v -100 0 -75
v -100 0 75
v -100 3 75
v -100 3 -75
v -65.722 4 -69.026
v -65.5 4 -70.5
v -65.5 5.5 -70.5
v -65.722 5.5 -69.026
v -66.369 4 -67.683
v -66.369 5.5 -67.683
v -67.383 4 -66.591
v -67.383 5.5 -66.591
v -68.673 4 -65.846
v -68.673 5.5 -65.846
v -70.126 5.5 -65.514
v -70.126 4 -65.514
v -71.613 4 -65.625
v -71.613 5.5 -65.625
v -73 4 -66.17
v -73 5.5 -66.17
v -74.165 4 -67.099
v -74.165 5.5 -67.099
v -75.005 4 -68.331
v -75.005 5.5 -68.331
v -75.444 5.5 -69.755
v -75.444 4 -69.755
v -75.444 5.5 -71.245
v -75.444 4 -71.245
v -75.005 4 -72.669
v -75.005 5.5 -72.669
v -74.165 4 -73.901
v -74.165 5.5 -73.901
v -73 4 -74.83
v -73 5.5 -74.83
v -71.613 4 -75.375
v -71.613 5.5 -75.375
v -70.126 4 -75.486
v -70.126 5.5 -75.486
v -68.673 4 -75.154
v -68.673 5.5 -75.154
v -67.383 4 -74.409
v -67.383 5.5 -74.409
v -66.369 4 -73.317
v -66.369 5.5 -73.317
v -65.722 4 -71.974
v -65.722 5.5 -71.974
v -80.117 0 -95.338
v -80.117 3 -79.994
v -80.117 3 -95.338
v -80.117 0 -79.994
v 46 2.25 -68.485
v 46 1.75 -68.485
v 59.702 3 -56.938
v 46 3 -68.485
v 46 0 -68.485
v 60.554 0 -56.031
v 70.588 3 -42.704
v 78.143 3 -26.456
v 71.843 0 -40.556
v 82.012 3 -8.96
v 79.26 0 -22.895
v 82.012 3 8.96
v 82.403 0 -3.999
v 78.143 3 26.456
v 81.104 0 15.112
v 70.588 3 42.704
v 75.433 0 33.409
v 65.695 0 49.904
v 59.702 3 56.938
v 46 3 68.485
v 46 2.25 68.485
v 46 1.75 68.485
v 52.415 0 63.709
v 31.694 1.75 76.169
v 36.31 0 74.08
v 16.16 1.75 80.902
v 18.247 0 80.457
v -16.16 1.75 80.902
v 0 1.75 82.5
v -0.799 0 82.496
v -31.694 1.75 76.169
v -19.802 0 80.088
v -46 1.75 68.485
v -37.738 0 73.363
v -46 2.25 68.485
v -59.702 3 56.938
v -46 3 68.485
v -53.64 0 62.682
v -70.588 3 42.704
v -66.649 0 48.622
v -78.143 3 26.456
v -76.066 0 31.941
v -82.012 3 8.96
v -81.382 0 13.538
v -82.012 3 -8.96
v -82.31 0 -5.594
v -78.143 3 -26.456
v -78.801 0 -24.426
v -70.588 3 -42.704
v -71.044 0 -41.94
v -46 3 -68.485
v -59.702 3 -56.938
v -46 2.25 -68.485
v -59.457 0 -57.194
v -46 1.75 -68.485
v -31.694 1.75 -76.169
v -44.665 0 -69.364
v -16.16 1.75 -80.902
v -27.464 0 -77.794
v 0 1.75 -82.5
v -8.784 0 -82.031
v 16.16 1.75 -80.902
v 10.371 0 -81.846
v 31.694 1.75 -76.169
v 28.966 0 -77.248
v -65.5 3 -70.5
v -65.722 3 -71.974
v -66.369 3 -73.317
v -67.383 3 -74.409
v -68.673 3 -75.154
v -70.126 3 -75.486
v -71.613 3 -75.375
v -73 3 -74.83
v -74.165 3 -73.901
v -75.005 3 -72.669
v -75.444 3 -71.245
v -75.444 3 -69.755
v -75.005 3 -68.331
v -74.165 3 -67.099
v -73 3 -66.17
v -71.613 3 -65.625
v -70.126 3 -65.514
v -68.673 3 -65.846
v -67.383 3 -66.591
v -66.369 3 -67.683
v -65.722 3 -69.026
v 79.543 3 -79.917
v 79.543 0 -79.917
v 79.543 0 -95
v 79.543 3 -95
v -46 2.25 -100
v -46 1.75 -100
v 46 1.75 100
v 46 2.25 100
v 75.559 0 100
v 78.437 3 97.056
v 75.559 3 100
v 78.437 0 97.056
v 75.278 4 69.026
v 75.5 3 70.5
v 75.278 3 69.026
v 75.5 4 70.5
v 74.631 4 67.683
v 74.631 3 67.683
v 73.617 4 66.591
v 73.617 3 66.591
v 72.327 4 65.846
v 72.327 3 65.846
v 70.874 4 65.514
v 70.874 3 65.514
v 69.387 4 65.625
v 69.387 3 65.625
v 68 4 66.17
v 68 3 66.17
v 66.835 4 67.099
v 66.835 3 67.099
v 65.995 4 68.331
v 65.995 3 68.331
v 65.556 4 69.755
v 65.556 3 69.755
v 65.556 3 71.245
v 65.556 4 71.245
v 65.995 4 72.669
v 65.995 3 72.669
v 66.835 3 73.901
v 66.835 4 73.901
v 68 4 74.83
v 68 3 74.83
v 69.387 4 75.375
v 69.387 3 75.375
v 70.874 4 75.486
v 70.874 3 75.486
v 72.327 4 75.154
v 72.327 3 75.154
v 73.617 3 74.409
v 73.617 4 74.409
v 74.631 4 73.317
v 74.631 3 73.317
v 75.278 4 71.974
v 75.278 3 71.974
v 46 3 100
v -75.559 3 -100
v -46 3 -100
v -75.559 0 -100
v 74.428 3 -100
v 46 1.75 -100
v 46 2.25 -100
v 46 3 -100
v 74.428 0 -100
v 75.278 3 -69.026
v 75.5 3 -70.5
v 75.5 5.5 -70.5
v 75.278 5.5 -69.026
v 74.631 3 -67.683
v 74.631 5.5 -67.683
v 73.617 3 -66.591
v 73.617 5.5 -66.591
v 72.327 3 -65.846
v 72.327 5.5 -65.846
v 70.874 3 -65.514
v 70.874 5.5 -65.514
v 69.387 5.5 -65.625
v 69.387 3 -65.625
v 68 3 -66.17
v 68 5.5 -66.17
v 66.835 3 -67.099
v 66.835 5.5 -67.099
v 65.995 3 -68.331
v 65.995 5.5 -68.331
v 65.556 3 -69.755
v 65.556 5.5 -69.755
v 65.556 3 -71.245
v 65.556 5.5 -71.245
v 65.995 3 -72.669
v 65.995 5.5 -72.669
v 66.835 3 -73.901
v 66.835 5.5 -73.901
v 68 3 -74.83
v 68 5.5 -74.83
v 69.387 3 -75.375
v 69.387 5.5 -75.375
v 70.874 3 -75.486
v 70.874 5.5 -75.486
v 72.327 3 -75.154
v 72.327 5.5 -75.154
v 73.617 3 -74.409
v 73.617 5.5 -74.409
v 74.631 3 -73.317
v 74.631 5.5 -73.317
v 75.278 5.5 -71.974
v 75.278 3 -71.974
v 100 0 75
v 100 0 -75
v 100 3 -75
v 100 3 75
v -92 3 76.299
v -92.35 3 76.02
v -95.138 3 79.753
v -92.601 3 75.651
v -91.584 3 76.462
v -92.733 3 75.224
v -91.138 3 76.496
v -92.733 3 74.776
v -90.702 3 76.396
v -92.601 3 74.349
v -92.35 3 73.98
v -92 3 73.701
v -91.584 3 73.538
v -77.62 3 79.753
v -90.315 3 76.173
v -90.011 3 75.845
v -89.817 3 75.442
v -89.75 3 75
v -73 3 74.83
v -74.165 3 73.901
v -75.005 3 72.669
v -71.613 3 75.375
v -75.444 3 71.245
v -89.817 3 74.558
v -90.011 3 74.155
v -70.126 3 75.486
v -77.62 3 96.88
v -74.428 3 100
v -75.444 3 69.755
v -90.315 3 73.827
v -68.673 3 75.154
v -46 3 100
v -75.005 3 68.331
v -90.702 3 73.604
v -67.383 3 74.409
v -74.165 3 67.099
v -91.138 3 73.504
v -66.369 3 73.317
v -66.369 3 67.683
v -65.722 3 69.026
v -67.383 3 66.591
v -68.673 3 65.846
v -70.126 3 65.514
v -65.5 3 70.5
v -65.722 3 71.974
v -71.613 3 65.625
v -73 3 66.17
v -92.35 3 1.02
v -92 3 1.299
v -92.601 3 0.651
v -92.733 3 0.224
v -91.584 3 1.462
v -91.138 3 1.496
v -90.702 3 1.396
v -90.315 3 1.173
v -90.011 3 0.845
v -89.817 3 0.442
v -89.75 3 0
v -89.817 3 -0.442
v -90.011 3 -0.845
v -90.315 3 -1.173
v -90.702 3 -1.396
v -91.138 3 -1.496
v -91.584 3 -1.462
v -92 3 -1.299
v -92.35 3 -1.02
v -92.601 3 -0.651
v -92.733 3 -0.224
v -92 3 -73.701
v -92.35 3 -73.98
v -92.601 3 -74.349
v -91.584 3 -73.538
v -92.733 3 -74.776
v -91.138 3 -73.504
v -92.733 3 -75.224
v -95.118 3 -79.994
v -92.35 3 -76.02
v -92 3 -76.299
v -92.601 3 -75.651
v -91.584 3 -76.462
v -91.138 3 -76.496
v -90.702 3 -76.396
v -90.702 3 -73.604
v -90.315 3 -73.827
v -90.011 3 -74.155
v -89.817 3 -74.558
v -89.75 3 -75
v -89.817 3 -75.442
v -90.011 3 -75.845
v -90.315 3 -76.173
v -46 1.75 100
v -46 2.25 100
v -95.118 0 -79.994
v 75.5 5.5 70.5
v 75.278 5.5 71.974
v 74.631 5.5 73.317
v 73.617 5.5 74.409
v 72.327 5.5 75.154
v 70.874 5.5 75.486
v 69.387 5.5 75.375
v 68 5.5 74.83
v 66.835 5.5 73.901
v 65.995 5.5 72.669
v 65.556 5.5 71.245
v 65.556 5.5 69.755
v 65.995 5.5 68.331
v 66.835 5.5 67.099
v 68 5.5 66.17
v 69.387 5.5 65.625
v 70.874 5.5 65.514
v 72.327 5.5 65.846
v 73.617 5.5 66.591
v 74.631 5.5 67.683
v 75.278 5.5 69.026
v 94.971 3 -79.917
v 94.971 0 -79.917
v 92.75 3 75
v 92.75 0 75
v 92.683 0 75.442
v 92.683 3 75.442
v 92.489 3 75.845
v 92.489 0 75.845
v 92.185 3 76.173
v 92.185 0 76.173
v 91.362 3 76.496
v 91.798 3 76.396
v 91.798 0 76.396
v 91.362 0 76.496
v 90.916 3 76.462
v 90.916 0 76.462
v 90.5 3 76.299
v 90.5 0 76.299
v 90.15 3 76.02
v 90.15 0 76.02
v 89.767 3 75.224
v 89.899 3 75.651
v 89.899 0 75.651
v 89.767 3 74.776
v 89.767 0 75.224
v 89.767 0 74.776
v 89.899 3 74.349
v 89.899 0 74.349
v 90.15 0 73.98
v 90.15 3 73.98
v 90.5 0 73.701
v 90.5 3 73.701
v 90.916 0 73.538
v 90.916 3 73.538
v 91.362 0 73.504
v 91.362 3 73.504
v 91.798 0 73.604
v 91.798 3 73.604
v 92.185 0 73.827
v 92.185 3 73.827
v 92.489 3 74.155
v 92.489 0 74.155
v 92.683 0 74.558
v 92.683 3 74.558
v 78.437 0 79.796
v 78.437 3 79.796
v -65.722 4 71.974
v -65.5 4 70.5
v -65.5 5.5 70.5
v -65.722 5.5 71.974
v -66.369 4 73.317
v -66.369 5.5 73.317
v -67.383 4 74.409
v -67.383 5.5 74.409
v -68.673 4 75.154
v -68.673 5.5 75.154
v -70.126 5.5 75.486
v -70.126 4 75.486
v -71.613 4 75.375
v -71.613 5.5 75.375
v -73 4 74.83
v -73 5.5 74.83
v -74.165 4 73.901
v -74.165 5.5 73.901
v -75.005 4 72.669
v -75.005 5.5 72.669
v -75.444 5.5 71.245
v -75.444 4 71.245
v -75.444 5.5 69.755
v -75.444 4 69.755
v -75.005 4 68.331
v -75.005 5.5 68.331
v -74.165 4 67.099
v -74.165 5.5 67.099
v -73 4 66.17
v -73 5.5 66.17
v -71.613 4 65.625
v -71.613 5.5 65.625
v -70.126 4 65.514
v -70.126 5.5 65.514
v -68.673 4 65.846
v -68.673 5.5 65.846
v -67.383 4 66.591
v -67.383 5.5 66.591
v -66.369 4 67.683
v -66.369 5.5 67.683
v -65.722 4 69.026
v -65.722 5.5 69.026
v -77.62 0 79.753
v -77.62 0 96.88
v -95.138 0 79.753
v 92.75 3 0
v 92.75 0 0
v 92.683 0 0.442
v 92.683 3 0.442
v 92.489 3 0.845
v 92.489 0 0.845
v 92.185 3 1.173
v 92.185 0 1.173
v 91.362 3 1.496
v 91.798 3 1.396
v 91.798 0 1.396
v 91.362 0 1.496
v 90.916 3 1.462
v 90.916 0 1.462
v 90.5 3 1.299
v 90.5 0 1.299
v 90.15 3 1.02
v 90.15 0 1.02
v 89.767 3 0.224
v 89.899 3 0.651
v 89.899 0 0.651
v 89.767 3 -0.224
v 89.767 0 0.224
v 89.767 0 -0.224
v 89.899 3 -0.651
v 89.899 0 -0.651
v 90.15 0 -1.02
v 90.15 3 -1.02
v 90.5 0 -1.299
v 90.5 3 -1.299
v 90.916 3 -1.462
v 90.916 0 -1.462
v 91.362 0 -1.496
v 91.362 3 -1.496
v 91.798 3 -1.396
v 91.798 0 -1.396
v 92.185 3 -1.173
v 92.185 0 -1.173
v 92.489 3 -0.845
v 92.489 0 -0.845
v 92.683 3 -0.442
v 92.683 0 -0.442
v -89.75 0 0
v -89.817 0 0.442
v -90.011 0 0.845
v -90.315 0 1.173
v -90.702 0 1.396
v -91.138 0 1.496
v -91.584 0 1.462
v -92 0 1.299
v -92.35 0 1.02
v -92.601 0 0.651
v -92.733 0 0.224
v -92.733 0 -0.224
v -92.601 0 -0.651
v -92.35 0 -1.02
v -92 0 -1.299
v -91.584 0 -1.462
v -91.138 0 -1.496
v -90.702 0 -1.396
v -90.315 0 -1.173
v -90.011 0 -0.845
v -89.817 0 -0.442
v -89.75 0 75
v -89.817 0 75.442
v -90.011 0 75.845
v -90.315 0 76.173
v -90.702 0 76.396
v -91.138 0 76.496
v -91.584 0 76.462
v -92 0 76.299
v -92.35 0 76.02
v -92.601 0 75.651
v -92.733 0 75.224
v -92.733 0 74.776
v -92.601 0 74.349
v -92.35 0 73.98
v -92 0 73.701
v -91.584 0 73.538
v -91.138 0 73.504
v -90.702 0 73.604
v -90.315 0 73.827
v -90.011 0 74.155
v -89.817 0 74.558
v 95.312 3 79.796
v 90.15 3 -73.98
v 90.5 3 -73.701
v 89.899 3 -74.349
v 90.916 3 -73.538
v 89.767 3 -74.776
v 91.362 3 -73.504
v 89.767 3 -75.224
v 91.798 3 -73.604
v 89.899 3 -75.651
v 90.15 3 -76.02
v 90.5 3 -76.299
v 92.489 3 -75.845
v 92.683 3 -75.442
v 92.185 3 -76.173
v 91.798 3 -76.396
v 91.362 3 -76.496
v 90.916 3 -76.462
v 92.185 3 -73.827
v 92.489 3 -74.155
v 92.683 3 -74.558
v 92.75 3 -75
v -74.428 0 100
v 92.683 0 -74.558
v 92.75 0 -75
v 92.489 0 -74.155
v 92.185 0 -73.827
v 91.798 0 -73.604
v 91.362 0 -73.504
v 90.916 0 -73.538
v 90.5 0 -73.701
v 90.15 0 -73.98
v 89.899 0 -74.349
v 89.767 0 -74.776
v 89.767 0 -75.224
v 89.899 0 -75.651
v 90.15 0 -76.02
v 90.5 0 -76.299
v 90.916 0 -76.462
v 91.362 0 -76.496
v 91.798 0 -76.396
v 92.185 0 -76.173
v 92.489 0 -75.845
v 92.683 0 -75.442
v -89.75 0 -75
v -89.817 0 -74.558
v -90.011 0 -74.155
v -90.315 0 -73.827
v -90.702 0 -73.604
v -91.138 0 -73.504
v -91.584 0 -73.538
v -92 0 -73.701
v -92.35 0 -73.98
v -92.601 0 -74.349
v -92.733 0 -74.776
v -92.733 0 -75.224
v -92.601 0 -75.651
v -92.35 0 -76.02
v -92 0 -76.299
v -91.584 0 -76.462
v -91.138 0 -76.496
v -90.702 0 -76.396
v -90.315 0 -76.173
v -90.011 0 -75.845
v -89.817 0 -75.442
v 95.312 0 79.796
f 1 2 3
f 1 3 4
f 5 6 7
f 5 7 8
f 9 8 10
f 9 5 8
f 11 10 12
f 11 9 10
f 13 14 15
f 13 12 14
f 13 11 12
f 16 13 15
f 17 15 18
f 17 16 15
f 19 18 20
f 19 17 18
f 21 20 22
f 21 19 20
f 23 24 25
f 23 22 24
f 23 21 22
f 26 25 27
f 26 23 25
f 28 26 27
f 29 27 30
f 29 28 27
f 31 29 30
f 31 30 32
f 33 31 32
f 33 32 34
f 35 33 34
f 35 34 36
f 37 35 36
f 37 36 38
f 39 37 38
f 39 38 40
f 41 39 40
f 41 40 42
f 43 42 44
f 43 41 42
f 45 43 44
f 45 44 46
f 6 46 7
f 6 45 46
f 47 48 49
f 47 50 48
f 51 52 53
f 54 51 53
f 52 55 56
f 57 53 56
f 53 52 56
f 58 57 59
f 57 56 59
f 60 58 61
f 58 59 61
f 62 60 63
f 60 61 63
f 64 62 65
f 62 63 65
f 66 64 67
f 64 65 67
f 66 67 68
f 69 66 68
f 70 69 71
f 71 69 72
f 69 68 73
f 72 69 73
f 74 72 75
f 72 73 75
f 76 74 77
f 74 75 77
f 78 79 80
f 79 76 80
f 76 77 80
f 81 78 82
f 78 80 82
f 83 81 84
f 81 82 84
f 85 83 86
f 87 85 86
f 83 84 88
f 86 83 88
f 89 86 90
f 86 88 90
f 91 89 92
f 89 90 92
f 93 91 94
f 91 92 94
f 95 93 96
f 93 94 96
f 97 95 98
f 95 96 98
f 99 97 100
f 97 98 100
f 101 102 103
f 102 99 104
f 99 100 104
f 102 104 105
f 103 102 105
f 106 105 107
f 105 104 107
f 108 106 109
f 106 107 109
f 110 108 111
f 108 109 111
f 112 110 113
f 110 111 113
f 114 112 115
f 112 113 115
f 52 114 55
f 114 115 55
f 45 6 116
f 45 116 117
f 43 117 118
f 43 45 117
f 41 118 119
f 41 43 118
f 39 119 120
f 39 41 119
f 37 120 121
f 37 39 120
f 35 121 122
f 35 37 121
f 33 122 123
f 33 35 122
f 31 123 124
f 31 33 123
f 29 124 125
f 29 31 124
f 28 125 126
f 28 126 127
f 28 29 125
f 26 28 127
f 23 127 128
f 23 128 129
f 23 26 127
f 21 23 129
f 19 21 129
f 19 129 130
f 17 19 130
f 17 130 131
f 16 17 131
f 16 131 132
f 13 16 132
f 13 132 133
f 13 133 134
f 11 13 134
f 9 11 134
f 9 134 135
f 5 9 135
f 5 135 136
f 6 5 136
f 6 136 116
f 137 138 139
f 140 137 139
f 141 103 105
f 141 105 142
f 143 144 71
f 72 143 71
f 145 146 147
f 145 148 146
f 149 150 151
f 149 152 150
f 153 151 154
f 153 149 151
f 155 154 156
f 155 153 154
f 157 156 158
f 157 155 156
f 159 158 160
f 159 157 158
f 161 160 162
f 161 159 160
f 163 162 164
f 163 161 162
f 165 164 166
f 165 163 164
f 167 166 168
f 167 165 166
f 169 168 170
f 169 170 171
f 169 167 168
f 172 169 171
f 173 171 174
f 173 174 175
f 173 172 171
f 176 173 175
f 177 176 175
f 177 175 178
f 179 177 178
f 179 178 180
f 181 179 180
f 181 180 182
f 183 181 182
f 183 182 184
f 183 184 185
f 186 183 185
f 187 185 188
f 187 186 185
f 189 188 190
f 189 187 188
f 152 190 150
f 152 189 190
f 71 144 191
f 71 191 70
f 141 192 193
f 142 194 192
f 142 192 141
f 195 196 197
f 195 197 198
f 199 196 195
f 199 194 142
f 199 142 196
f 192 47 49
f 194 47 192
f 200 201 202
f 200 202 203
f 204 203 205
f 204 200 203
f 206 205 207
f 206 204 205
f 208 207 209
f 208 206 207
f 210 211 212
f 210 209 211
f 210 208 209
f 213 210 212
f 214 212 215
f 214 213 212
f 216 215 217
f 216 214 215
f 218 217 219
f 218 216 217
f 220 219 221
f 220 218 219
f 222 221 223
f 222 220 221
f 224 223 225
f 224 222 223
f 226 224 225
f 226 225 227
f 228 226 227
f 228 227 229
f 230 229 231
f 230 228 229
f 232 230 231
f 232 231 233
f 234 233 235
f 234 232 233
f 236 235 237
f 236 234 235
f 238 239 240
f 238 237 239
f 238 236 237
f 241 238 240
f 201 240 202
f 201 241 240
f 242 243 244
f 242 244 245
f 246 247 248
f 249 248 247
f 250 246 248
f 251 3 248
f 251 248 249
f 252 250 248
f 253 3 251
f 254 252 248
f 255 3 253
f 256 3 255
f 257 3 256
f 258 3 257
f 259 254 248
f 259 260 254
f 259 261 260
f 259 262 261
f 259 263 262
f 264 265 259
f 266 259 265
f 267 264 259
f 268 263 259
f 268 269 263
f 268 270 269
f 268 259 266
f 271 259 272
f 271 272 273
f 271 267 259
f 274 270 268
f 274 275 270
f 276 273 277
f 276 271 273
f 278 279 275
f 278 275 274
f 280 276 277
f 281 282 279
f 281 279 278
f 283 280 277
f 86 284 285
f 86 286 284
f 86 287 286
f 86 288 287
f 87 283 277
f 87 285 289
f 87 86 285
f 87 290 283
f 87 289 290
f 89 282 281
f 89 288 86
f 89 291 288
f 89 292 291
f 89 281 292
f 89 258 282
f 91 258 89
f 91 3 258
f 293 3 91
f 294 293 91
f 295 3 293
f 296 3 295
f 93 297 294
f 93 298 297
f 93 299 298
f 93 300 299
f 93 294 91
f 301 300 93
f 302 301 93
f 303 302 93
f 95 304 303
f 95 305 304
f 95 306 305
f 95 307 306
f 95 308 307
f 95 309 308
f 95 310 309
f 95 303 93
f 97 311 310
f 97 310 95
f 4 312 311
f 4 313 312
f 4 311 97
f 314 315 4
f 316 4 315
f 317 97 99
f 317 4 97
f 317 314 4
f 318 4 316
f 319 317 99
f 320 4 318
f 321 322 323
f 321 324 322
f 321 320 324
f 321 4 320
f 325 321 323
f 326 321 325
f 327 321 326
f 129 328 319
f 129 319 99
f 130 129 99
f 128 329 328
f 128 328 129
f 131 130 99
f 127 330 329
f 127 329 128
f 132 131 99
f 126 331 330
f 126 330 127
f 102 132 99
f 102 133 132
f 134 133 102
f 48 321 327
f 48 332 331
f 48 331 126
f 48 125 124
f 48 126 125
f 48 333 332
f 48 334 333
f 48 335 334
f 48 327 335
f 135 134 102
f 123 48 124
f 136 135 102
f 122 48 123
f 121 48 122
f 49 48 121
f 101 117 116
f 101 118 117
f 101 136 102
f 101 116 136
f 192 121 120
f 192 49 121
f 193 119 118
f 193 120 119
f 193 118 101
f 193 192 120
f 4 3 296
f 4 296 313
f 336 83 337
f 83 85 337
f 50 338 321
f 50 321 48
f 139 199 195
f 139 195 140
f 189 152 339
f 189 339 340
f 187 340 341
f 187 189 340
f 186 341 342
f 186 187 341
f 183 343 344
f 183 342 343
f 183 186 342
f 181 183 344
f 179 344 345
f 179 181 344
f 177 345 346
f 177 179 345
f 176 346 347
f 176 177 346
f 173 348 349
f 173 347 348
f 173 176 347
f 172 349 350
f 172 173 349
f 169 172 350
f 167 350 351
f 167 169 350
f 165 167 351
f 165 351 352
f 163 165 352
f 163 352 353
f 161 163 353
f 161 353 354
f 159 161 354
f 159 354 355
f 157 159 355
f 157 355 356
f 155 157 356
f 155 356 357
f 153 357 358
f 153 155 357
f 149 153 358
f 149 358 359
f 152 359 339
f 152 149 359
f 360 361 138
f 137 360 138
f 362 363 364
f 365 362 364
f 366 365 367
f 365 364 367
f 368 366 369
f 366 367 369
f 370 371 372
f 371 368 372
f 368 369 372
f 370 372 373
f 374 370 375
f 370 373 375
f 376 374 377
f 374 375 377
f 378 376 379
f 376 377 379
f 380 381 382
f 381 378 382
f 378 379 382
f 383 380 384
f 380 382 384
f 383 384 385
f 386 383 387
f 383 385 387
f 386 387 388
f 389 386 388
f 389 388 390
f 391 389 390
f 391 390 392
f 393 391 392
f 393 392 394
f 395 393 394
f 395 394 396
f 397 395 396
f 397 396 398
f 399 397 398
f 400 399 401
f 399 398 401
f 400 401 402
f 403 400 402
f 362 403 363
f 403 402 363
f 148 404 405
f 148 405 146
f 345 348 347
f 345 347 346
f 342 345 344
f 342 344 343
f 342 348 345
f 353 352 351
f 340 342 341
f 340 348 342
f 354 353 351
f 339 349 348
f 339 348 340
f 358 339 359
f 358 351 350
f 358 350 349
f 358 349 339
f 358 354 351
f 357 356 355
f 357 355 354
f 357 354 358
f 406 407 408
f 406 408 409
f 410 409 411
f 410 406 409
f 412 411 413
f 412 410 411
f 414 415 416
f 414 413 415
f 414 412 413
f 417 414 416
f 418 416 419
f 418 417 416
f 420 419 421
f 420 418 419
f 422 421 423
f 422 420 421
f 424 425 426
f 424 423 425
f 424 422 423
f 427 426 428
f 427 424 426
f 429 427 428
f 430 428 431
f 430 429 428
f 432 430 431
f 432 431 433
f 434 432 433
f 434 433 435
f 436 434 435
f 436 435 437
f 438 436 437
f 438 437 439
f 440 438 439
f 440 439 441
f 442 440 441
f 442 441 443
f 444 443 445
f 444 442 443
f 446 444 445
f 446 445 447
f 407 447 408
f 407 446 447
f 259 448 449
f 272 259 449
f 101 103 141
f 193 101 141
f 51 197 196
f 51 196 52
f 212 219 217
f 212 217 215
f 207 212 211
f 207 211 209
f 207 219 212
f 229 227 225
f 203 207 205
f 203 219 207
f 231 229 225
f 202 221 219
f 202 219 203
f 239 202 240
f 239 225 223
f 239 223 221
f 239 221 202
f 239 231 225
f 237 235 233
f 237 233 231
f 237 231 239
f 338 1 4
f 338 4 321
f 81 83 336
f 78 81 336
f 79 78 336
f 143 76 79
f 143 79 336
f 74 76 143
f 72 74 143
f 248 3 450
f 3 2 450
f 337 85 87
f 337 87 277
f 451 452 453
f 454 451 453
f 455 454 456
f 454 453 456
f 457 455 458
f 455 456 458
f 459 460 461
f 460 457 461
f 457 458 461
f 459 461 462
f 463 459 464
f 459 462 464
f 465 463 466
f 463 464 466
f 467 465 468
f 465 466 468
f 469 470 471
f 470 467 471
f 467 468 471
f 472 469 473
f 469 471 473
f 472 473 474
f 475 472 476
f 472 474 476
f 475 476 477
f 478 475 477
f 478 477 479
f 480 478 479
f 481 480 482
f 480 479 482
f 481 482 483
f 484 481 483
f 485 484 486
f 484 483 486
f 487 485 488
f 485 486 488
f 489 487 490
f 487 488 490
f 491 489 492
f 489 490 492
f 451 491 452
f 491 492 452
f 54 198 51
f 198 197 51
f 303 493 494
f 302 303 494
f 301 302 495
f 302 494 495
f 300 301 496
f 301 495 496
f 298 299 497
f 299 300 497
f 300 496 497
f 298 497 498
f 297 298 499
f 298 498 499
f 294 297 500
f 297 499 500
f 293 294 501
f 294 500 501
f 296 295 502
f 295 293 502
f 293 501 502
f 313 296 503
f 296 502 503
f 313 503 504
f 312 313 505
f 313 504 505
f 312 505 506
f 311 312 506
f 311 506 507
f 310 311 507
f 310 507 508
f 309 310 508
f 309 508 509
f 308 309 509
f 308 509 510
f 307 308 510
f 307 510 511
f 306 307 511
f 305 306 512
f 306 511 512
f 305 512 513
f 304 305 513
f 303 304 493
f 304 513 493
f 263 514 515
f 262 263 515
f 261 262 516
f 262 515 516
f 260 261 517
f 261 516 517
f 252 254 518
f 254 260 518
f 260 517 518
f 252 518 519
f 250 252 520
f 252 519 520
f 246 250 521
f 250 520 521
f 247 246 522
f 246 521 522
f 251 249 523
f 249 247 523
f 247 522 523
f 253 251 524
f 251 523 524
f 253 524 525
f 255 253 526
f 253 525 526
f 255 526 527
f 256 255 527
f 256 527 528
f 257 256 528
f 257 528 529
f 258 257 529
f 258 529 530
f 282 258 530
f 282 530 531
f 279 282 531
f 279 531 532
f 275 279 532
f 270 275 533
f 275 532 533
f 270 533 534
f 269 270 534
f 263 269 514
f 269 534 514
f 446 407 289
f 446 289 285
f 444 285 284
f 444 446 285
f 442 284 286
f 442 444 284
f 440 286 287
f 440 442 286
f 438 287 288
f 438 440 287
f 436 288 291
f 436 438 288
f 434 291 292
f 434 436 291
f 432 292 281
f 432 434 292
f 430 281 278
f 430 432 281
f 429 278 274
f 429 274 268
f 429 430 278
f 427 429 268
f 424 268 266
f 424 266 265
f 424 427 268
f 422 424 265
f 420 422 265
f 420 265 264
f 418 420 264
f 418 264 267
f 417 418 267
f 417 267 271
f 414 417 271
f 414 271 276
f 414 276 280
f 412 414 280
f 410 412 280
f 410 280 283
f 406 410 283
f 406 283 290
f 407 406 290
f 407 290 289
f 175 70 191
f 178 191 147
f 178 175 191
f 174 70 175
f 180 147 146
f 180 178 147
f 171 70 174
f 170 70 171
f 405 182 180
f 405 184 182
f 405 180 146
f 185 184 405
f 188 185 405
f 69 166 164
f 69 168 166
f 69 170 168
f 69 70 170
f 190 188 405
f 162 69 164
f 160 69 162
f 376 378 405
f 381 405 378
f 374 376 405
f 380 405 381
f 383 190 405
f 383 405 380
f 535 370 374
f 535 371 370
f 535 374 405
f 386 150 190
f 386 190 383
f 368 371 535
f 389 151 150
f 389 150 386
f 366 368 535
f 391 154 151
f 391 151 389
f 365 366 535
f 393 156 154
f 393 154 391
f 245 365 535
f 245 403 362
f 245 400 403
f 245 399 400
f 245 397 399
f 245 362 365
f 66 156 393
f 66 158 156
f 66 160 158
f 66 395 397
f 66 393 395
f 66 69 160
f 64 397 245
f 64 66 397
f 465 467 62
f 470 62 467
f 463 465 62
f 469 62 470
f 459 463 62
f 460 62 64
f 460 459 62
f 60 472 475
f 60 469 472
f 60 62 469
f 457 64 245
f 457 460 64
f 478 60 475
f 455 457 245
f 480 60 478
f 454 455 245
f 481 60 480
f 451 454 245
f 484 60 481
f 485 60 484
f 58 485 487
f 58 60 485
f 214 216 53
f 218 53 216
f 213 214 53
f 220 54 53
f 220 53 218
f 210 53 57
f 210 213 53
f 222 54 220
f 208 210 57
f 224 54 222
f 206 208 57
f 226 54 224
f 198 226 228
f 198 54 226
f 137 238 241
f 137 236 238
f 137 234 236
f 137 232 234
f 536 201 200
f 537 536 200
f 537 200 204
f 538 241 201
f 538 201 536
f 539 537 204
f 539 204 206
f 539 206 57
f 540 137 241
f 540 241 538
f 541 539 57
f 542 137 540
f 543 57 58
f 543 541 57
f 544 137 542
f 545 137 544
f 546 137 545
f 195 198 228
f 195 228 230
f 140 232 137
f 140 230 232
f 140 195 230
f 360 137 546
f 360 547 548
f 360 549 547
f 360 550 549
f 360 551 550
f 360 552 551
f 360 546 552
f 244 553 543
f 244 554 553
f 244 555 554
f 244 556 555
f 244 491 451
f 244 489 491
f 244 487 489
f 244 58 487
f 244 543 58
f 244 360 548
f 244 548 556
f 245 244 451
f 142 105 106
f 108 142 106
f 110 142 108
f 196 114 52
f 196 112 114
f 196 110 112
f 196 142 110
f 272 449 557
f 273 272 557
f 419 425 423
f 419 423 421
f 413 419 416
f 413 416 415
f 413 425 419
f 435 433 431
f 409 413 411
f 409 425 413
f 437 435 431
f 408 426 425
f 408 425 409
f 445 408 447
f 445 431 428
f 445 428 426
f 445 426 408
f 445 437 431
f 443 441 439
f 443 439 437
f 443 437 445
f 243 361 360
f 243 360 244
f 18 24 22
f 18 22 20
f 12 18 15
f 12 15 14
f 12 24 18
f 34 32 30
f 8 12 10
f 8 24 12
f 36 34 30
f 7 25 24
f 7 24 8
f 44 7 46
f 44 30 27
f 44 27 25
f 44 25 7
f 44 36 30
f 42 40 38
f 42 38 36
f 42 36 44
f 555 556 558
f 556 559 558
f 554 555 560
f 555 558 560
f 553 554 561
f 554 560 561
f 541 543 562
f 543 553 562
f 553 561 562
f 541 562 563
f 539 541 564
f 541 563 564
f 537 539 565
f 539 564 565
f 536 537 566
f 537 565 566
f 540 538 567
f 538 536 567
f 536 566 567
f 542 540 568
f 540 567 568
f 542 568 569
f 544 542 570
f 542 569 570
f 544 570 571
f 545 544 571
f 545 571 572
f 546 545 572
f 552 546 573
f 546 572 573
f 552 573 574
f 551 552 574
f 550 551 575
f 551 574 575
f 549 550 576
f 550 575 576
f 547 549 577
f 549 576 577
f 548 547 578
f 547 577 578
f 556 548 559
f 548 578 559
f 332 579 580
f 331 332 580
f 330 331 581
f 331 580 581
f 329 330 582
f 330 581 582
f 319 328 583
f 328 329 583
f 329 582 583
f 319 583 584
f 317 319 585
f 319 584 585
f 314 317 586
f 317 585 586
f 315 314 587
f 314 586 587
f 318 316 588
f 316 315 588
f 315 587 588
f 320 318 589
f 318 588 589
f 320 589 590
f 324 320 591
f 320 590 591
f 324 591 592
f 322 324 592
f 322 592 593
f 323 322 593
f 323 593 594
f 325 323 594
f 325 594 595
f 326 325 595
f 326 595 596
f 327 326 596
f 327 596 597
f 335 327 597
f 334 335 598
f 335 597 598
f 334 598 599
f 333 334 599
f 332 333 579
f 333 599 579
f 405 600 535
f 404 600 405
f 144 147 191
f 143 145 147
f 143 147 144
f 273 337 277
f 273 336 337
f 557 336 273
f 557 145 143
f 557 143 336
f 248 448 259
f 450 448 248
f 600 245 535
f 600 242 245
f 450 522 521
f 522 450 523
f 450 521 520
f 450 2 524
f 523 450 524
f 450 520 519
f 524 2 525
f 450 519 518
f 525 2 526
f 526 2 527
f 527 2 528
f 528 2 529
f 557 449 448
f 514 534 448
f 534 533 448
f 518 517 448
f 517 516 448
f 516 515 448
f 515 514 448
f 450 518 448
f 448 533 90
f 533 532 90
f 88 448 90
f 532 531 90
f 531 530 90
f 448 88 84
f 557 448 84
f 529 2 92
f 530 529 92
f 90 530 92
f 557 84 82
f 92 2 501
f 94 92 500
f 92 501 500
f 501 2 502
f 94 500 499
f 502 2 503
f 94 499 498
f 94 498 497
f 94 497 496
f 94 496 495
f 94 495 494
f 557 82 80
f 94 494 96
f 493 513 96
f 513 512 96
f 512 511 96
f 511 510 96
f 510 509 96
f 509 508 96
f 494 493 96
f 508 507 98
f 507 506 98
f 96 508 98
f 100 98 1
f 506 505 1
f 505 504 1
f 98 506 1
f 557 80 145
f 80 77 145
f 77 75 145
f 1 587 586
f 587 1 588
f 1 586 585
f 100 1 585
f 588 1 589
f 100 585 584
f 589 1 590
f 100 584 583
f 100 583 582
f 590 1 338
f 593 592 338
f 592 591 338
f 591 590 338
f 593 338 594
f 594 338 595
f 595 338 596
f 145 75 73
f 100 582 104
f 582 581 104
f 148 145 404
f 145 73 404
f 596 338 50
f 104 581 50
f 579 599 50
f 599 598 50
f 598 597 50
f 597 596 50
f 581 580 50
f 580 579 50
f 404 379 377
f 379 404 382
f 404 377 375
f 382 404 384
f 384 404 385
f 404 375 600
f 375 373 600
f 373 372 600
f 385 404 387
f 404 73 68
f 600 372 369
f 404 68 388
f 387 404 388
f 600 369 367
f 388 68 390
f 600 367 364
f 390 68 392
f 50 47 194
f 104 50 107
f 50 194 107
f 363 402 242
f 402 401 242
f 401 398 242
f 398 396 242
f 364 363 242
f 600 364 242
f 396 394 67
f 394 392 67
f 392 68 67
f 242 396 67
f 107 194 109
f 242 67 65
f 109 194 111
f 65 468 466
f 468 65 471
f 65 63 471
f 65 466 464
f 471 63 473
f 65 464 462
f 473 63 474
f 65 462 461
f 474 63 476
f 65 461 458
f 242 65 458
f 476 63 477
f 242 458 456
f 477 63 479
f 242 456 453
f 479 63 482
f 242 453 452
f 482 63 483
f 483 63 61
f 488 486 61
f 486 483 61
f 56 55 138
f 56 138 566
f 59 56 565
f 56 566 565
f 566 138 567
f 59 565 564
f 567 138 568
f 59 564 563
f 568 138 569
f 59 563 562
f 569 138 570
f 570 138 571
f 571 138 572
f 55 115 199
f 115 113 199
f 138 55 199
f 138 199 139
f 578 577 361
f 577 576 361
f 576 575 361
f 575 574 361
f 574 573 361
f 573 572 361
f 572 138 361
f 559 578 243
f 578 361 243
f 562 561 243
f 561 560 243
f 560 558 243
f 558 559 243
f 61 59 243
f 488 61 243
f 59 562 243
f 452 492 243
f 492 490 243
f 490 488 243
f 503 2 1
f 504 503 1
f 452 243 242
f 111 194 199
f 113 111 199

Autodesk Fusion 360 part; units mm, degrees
sketch "Sketch1" plane through (0, 0, 0) normal (0, 1, 0) x (1, 0, 0) in component "Raam_v3"
  line L0 (-100, 100) -> (100, 100)
  line L1 (100, 100) -> (100, -100)
  line L2 (100, -100) -> (-100, -100)
  line L3 (-100, -100) -> (-100, 100)
  circle A0 centre (0, 0) radius 82.5
  line L4 (-70.5, -70.5) -> (70.5, -70.5) construction
  line L5 (70.5, -70.5) -> (70.5, 70.5) construction
  line L6 (70.5, 70.5) -> (-70.5, 70.5) construction
  line L7 (-70.5, 70.5) -> (-70.5, -70.5) construction
  line L8 (-46, -100) -> (46, -100)
  line L9 (46, -100) -> (46, -68)
  line L10 (46, -68) -> (-46, -68)
  line L11 (-46, -68) -> (-46, -100)
  line L12 (-46, 100) -> (46, 100)
  line L13 (46, 100) -> (46, 68)
  line L14 (46, 68) -> (-46, 68)
  line L15 (-46, 68) -> (-46, 100)
  circle A1 centre (70.5, -70.5) radius 5
  circle A2 centre (-70.5, -70.5) radius 5
  circle A3 centre (70.5, 70.5) radius 5
  circle A4 centre (-70.5, 70.5) radius 5
  line L16 (-91.25, -91.25) -> (91.25, -91.25) construction
  line L17 (91.25, -91.25) -> (91.25, 91.25) construction
  line L18 (91.25, 91.25) -> (-91.25, 91.25) construction
  line L19 (-91.25, 91.25) -> (-91.25, -91.25) construction
  line L20 (0, -100) -> (0, 100) construction
  line L21 (-100, 0) -> (100, 0) construction
  line L22 (-100, -75) -> (-74.4285, -100)
  line L23 (100, -75) -> (75.5588, -100)
  line L24 (-100, 75) -> (-75.5588, 100)
  line L25 (74.4285, 100) -> (100, 75)
  circle A5 centre (-91.25, 0) radius 1.5
  circle A6 centre (91.25, 0) radius 1.5
  line L26 (-100, -75) -> (100, -75) construction
  circle A7 centre (91.25, -75) radius 1.5
  line L27 (-100, 75) -> (100, 75) construction
  circle A8 centre (91.25, 75) radius 1.5
  circle A9 centre (-91.25, 75) radius 1.5
  circle A10 centre (-91.25, -75) radius 1.5
  line L28 (-95.1383, -79.753) -> (-77.6201, -79.753)
  line L29 (-77.6201, -79.753) -> (-77.6201, -96.8797)
  line L30 (-83.7274, -79.753) -> (-83.7274, -80)
  line L31 (95.3116, -79.7956) -> (78.4368, -79.7956)
  line L32 (78.4368, -79.7956) -> (78.4368, -97.0562)
  line L33 (-95.1178, 79.9938) -> (-80.1166, 79.9938)
  line L34 (-80.1166, 79.9938) -> (-80.1166, 95.3379)
  line L35 (94.9708, 79.9168) -> (79.5428, 79.9168)
  line L36 (79.5428, 79.9168) -> (79.5428, 95)
  dimension "d1" = 200
  dimension "d2" = 200
  dimension "d3" = 165
  dimension "d6" = 141
  dimension "d7" = 141
  dimension "d8" = 29.5
  dimension "d9" = 29.5
  dimension "d11" = 100
  dimension "d12" = 100
  dimension "d18" = 92
  dimension "d19" = 32
  dimension "d20" = 46
  dimension "d21" = 92
  dimension "d22" = 32
  dimension "d23" = 46
  dimension "d24" = 10
  dimension "d25" = 10
  dimension "d26" = 10
  dimension "d27" = 10
  dimension "d28" = 182.5
  dimension "d29" = 182.5
  dimension "d30" = 70.5
  dimension "d31" = 8.75
  dimension "d32" = 8.75
  dimension "d33" = 3
  dimension "d34" = 3
  dimension "d53" = 12.3744
  dimension "d54" = 12.3744
  dimension "d55" = 12.3744
  dimension "d56" = 12.3744
  dimension "d57" = 41.7193
  dimension "d58" = 41.7193
  dimension "d59" = 75
  dimension "d60" = 3
  dimension "d61" = 75
  dimension "d62" = 3
  dimension "d63" = 3
  dimension "d64" = 3
extrude "Extrude11" add sketch "Sketch1" along normal blind 1.25 contours L0 A0 L12 L13 L15 | L2 A0 L8 L9 L11 makes body 1 at (0, 0, -94.1667) makes body 2 at (0, 0, 94.1667) in component "Raam_v3"
extrude "Extrude10" add sketch "Sketch1" along normal blind 2 separate body contours L0 L2 L3 A0 L11 L15 L22 L24 L28 L29 L33 L34 | L0 L1 L2 A0 L9 L13 L23 L25 L31 L32 L35 L36 makes body 3 at (-63.4107, 0, -91.7181) makes body 4 at (63.4107, 2, 91.7181) in component "Raam_v3"
extrude "Extrude12" add sketch "Sketch1" along normal blind 3.5 contours A2 bodies 3 in component "Raam_v3"
extrude "Extrude13" add sketch "Sketch1" along normal blind 3.5 contours A1 bodies 4 in component "Raam_v3"
extrude "Extrude14" add sketch "Sketch1" along normal blind 3.5 contours A4 bodies 3 in component "Raam_v3"
extrude "Extrude15" add sketch "Sketch1" along normal blind 3.5 contours A3 bodies 4 in component "Raam_v3"
extrude "Extrude16" add 1 faces at (63.4107, 2, 91.7181) along direction (0, 1, 0) blind 2 on bodies 4 bodies 4 in component "Raam_v3"
extrude "Extrude17" add 1 faces at (-63.4107, 2, -91.7181) along direction (0, 1, 0) blind 2 on bodies 3 bodies 3 in component "Raam_v3"
extrude "Extrude18" add 1 faces at (0, 1.25, 94.1667) along direction (0, 1, 0) blind 1 on bodies 2 bodies 2 3 4 in component "Raam_v3"
extrude "Extrude19" add 1 faces at (0, 1.25, -94.1667) along direction (0, 1, 0) blind 1 on bodies 1 bodies 1 2 in component "Raam_v3"
extrude "Extrude20" add 1 faces at (-69.0538, 3.5, 70.0197) along direction (0, 1, 0) blind 4 on bodies 1 bodies 1 in component "Raam_v3"
extrude "Extrude21" cut 1 faces at (-69.0538, 7.5, 70.0197) along direction (0, -1, 0) blind 1 on bodies 1 bodies 1 in component "Raam_v3"
extrude "Extrude22" add 1 faces at (71.8216, 3.5, 69.804) along direction (0, 1, 0) blind 3 on bodies 1 bodies 1 in component "Raam_v3"
extrude "Extrude23" add 1 faces at (-69.0538, 3.5, -70.9803) along direction (0, 1, 0) blind 3 on bodies 1 bodies 1 in component "Raam_v3"
extrude "Extrude24" cut 1 faces at (-63.4107, 4, -91.7181) along direction (0, -1, 0) blind 1 on bodies 1 bodies 1 in component "Raam_v3"
extrude "Extrude25" cut 1 faces at (63.4107, 4, 91.7181) along direction (0, -1, 0) blind 1 on bodies 1 bodies 1 in component "Raam_v3"
extrude "Extrude26" cut 1 faces at (0, 2.25, 94.1667) along direction (0, -1, 0) blind 0.5 on bodies 1 bodies 1 in component "Raam_v3"
extrude "Extrude27" cut 1 faces at (0, 2.25, -94.1667) along direction (0, -1, 0) blind 0.5 on bodies 1 bodies 1 in component "Raam_v3"
extrude "Extrude28" cut 1 faces at (-69.0538, 6.5, 70.0197) along direction (0, -1, 0) blind 1 on bodies 1 bodies 1 in component "Raam_v3"
extrude "Extrude29" cut 1 faces at (71.8216, 6.5, 69.804) along direction (0, -1, 0) blind 1 on bodies 1 bodies 1 in component "Raam_v3"
extrude "Extrude30" cut 1 faces at (71.8216, 3.5, -71.196) along direction (0, -1, 0) blind 1 on bodies 1 bodies 1 in component "Raam_v3"
extrude "Extrude31" cut 1 faces at (-69.0538, 6.5, -70.9803) along direction (0, -1, 0) blind 1 on bodies 1 bodies 1 in component "Raam_v3"
extrude "Extrude32" add 1 faces at (71.8216, 2.5, -71.196) along direction (0, 1, 0) blind 3 on bodies 1 bodies 1 in component "Raam_v3"
extrude "Extrude2" [suppressed] in component "Raam_v3"
extrude "Extrude1" [suppressed] in component "Raam_v3"
extrude "Extrude3" [suppressed] in component "Raam_v3"
extrude "Extrude4" [suppressed] in component "Raam_v3"
extrude "Extrude5" [suppressed] in component "Raam_v3"
extrude "Extrude6" [suppressed] in component "Raam_v3"
extrude "Extrude7" [suppressed] in component "Raam_v3"
extrude "Extrude8" [suppressed] in component "Raam_v3"
extrude "Extrude9" [suppressed] in component "Raam_v3"
hole "Hole1" [suppressed] in component "Raam_v3"
hole "Hole2" [suppressed] in component "Raam_v3"
hole "Hole3" [suppressed] in component "Raam_v3"
move_body "Move1" [suppressed] in component "Raam_v3"
move_body "Move2" [suppressed] in component "Raam_v3"
hole "Hole4" [suppressed] in component "Raam_v3"
delete_face "DeleteFace1" [suppressed] in component "Raam_v3"
delete_face "DeleteFace2" [suppressed] in component "Raam_v3"
hole "Hole5" [suppressed] in component "Raam_v3"
delete_face "DeleteFace3" [suppressed] in component "Raam_v3"
hole "Hole6" [suppressed] in component "Raam_v3"
hole "Hole7" [suppressed] in component "Raam_v3"
component "Raam_v3" placed x (1, 0, 0) y (0, 1, 0) z (0, 0, 1) at (0, 0, 0)
